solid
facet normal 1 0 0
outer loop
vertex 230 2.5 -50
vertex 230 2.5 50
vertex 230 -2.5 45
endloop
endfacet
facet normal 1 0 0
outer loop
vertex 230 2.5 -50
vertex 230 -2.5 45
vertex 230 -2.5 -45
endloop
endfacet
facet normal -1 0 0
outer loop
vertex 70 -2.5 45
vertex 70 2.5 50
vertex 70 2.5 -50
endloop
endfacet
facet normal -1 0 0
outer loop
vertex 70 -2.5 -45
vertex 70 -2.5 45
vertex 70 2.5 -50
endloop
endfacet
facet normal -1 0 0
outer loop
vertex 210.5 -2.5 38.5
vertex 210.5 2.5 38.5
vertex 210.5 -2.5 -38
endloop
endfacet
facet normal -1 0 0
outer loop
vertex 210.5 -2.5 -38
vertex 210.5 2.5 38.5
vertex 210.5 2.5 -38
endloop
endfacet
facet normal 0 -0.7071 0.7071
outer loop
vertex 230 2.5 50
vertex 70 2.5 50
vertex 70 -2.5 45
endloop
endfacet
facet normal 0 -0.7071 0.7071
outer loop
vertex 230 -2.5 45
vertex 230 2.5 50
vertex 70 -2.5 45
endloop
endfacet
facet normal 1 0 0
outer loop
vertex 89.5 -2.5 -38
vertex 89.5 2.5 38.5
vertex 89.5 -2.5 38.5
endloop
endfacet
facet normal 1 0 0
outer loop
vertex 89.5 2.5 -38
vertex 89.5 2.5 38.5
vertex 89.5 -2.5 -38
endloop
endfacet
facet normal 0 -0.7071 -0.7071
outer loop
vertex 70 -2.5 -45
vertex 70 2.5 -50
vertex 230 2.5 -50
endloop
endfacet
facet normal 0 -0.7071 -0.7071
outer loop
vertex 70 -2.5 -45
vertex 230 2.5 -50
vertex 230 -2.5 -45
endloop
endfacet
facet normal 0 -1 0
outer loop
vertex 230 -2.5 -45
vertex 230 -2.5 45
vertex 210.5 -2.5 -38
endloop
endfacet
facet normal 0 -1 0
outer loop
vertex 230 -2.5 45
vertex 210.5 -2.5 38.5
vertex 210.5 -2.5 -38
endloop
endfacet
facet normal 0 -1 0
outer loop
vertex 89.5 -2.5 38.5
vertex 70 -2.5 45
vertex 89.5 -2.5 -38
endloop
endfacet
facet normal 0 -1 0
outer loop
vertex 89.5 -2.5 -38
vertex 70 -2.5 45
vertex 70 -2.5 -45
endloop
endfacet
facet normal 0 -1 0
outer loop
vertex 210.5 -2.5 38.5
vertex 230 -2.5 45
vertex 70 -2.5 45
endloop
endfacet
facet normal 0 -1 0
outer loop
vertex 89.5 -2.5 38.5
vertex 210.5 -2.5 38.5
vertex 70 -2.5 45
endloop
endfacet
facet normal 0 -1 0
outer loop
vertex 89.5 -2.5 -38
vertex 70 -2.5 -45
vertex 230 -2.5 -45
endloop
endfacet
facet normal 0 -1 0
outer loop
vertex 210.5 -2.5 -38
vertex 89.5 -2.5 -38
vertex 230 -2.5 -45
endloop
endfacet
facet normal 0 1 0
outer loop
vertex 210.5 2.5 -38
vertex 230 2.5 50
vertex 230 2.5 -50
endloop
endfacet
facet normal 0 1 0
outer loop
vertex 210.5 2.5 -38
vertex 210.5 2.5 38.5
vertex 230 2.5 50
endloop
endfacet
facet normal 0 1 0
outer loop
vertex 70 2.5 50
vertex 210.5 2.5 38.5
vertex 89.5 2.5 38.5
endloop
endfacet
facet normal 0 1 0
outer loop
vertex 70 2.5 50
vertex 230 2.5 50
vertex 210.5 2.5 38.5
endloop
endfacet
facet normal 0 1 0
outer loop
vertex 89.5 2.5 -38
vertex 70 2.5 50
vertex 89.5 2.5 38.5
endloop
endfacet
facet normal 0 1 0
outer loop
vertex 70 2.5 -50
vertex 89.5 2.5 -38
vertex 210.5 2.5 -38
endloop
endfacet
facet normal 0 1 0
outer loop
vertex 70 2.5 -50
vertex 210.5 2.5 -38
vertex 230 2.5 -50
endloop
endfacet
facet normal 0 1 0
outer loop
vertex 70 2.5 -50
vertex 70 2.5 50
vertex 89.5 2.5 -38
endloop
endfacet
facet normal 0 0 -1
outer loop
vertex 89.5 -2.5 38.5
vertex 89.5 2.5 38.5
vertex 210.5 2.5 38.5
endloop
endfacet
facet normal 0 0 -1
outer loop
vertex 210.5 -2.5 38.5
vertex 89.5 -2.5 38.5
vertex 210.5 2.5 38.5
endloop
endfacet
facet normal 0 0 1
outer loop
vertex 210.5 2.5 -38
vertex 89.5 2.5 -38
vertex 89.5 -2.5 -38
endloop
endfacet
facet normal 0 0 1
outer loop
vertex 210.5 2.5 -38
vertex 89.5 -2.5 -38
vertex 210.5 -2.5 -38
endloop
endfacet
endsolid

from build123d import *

# Parameters (mm, degrees)
SKETCH1_W           = 100
SKETCH1_H           = 5
BOSS_EXTRUDE1_DEPTH = 300
CUT_EXTRUDE1_DEPTH  = 300
SKETCH3_W           = 121
SKETCH3_H           = 76.5
CUT_EXTRUDE2_DEPTH  = 5
CUT_EXTRUDE3_DEPTH  = 300
SKETCH5_W           = 70
SKETCH5_H           = 100
CUT_EXTRUDE4_DEPTH  = 5


with BuildPart() as part:
    # Sketch1 → Boss-Extrude1 (new body)
    with BuildSketch(Plane(origin=(0, 0, 0), x_dir=(0, 0, -1), z_dir=(1, 0, 0))):
        Rectangle(SKETCH1_W, SKETCH1_H)
    extrude(amount=BOSS_EXTRUDE1_DEPTH)

    # Sketch2 → Cut-Extrude1 (cut)
    with BuildSketch(Plane(origin=(300, 0, 0), x_dir=(0, 0, -1), z_dir=(1, 0, 0))):
        Polygon((-50, 2.5), (-45, -2.5), (-50, -2.5), align=None)
    extrude(amount=-CUT_EXTRUDE1_DEPTH, mode=Mode.SUBTRACT)

    # Sketch3 → Cut-Extrude2 (cut)
    with BuildSketch(Plane(origin=(0, 2.5, 0), x_dir=(1, 0, 0), z_dir=(0, 1, 0))):
        with Locations((150, -0.25)):
            Rectangle(SKETCH3_W, SKETCH3_H)
    extrude(amount=-CUT_EXTRUDE2_DEPTH, mode=Mode.SUBTRACT)

    # Sketch4 → Cut-Extrude3 (cut)
    with BuildSketch(Plane(origin=(300, 0, 0), x_dir=(0, 0, -1), z_dir=(1, 0, 0))):
        Polygon((50, 2.5), (45, -2.5), (50, -2.5), align=None)
    extrude(amount=-CUT_EXTRUDE3_DEPTH, mode=Mode.SUBTRACT)

    # Sketch5 → Cut-Extrude4 (cut)
    with BuildSketch(Plane(origin=(0, 2.5, 0), x_dir=(1, 0, 0), z_dir=(0, 1, 0))):
        with Locations((35, 0)):
            Rectangle(SKETCH5_W, SKETCH5_H)
        with Locations((265, 0)):
            Rectangle(SKETCH5_W, SKETCH5_H)
    extrude(amount=-CUT_EXTRUDE4_DEPTH, mode=Mode.SUBTRACT)


solid = part.part
